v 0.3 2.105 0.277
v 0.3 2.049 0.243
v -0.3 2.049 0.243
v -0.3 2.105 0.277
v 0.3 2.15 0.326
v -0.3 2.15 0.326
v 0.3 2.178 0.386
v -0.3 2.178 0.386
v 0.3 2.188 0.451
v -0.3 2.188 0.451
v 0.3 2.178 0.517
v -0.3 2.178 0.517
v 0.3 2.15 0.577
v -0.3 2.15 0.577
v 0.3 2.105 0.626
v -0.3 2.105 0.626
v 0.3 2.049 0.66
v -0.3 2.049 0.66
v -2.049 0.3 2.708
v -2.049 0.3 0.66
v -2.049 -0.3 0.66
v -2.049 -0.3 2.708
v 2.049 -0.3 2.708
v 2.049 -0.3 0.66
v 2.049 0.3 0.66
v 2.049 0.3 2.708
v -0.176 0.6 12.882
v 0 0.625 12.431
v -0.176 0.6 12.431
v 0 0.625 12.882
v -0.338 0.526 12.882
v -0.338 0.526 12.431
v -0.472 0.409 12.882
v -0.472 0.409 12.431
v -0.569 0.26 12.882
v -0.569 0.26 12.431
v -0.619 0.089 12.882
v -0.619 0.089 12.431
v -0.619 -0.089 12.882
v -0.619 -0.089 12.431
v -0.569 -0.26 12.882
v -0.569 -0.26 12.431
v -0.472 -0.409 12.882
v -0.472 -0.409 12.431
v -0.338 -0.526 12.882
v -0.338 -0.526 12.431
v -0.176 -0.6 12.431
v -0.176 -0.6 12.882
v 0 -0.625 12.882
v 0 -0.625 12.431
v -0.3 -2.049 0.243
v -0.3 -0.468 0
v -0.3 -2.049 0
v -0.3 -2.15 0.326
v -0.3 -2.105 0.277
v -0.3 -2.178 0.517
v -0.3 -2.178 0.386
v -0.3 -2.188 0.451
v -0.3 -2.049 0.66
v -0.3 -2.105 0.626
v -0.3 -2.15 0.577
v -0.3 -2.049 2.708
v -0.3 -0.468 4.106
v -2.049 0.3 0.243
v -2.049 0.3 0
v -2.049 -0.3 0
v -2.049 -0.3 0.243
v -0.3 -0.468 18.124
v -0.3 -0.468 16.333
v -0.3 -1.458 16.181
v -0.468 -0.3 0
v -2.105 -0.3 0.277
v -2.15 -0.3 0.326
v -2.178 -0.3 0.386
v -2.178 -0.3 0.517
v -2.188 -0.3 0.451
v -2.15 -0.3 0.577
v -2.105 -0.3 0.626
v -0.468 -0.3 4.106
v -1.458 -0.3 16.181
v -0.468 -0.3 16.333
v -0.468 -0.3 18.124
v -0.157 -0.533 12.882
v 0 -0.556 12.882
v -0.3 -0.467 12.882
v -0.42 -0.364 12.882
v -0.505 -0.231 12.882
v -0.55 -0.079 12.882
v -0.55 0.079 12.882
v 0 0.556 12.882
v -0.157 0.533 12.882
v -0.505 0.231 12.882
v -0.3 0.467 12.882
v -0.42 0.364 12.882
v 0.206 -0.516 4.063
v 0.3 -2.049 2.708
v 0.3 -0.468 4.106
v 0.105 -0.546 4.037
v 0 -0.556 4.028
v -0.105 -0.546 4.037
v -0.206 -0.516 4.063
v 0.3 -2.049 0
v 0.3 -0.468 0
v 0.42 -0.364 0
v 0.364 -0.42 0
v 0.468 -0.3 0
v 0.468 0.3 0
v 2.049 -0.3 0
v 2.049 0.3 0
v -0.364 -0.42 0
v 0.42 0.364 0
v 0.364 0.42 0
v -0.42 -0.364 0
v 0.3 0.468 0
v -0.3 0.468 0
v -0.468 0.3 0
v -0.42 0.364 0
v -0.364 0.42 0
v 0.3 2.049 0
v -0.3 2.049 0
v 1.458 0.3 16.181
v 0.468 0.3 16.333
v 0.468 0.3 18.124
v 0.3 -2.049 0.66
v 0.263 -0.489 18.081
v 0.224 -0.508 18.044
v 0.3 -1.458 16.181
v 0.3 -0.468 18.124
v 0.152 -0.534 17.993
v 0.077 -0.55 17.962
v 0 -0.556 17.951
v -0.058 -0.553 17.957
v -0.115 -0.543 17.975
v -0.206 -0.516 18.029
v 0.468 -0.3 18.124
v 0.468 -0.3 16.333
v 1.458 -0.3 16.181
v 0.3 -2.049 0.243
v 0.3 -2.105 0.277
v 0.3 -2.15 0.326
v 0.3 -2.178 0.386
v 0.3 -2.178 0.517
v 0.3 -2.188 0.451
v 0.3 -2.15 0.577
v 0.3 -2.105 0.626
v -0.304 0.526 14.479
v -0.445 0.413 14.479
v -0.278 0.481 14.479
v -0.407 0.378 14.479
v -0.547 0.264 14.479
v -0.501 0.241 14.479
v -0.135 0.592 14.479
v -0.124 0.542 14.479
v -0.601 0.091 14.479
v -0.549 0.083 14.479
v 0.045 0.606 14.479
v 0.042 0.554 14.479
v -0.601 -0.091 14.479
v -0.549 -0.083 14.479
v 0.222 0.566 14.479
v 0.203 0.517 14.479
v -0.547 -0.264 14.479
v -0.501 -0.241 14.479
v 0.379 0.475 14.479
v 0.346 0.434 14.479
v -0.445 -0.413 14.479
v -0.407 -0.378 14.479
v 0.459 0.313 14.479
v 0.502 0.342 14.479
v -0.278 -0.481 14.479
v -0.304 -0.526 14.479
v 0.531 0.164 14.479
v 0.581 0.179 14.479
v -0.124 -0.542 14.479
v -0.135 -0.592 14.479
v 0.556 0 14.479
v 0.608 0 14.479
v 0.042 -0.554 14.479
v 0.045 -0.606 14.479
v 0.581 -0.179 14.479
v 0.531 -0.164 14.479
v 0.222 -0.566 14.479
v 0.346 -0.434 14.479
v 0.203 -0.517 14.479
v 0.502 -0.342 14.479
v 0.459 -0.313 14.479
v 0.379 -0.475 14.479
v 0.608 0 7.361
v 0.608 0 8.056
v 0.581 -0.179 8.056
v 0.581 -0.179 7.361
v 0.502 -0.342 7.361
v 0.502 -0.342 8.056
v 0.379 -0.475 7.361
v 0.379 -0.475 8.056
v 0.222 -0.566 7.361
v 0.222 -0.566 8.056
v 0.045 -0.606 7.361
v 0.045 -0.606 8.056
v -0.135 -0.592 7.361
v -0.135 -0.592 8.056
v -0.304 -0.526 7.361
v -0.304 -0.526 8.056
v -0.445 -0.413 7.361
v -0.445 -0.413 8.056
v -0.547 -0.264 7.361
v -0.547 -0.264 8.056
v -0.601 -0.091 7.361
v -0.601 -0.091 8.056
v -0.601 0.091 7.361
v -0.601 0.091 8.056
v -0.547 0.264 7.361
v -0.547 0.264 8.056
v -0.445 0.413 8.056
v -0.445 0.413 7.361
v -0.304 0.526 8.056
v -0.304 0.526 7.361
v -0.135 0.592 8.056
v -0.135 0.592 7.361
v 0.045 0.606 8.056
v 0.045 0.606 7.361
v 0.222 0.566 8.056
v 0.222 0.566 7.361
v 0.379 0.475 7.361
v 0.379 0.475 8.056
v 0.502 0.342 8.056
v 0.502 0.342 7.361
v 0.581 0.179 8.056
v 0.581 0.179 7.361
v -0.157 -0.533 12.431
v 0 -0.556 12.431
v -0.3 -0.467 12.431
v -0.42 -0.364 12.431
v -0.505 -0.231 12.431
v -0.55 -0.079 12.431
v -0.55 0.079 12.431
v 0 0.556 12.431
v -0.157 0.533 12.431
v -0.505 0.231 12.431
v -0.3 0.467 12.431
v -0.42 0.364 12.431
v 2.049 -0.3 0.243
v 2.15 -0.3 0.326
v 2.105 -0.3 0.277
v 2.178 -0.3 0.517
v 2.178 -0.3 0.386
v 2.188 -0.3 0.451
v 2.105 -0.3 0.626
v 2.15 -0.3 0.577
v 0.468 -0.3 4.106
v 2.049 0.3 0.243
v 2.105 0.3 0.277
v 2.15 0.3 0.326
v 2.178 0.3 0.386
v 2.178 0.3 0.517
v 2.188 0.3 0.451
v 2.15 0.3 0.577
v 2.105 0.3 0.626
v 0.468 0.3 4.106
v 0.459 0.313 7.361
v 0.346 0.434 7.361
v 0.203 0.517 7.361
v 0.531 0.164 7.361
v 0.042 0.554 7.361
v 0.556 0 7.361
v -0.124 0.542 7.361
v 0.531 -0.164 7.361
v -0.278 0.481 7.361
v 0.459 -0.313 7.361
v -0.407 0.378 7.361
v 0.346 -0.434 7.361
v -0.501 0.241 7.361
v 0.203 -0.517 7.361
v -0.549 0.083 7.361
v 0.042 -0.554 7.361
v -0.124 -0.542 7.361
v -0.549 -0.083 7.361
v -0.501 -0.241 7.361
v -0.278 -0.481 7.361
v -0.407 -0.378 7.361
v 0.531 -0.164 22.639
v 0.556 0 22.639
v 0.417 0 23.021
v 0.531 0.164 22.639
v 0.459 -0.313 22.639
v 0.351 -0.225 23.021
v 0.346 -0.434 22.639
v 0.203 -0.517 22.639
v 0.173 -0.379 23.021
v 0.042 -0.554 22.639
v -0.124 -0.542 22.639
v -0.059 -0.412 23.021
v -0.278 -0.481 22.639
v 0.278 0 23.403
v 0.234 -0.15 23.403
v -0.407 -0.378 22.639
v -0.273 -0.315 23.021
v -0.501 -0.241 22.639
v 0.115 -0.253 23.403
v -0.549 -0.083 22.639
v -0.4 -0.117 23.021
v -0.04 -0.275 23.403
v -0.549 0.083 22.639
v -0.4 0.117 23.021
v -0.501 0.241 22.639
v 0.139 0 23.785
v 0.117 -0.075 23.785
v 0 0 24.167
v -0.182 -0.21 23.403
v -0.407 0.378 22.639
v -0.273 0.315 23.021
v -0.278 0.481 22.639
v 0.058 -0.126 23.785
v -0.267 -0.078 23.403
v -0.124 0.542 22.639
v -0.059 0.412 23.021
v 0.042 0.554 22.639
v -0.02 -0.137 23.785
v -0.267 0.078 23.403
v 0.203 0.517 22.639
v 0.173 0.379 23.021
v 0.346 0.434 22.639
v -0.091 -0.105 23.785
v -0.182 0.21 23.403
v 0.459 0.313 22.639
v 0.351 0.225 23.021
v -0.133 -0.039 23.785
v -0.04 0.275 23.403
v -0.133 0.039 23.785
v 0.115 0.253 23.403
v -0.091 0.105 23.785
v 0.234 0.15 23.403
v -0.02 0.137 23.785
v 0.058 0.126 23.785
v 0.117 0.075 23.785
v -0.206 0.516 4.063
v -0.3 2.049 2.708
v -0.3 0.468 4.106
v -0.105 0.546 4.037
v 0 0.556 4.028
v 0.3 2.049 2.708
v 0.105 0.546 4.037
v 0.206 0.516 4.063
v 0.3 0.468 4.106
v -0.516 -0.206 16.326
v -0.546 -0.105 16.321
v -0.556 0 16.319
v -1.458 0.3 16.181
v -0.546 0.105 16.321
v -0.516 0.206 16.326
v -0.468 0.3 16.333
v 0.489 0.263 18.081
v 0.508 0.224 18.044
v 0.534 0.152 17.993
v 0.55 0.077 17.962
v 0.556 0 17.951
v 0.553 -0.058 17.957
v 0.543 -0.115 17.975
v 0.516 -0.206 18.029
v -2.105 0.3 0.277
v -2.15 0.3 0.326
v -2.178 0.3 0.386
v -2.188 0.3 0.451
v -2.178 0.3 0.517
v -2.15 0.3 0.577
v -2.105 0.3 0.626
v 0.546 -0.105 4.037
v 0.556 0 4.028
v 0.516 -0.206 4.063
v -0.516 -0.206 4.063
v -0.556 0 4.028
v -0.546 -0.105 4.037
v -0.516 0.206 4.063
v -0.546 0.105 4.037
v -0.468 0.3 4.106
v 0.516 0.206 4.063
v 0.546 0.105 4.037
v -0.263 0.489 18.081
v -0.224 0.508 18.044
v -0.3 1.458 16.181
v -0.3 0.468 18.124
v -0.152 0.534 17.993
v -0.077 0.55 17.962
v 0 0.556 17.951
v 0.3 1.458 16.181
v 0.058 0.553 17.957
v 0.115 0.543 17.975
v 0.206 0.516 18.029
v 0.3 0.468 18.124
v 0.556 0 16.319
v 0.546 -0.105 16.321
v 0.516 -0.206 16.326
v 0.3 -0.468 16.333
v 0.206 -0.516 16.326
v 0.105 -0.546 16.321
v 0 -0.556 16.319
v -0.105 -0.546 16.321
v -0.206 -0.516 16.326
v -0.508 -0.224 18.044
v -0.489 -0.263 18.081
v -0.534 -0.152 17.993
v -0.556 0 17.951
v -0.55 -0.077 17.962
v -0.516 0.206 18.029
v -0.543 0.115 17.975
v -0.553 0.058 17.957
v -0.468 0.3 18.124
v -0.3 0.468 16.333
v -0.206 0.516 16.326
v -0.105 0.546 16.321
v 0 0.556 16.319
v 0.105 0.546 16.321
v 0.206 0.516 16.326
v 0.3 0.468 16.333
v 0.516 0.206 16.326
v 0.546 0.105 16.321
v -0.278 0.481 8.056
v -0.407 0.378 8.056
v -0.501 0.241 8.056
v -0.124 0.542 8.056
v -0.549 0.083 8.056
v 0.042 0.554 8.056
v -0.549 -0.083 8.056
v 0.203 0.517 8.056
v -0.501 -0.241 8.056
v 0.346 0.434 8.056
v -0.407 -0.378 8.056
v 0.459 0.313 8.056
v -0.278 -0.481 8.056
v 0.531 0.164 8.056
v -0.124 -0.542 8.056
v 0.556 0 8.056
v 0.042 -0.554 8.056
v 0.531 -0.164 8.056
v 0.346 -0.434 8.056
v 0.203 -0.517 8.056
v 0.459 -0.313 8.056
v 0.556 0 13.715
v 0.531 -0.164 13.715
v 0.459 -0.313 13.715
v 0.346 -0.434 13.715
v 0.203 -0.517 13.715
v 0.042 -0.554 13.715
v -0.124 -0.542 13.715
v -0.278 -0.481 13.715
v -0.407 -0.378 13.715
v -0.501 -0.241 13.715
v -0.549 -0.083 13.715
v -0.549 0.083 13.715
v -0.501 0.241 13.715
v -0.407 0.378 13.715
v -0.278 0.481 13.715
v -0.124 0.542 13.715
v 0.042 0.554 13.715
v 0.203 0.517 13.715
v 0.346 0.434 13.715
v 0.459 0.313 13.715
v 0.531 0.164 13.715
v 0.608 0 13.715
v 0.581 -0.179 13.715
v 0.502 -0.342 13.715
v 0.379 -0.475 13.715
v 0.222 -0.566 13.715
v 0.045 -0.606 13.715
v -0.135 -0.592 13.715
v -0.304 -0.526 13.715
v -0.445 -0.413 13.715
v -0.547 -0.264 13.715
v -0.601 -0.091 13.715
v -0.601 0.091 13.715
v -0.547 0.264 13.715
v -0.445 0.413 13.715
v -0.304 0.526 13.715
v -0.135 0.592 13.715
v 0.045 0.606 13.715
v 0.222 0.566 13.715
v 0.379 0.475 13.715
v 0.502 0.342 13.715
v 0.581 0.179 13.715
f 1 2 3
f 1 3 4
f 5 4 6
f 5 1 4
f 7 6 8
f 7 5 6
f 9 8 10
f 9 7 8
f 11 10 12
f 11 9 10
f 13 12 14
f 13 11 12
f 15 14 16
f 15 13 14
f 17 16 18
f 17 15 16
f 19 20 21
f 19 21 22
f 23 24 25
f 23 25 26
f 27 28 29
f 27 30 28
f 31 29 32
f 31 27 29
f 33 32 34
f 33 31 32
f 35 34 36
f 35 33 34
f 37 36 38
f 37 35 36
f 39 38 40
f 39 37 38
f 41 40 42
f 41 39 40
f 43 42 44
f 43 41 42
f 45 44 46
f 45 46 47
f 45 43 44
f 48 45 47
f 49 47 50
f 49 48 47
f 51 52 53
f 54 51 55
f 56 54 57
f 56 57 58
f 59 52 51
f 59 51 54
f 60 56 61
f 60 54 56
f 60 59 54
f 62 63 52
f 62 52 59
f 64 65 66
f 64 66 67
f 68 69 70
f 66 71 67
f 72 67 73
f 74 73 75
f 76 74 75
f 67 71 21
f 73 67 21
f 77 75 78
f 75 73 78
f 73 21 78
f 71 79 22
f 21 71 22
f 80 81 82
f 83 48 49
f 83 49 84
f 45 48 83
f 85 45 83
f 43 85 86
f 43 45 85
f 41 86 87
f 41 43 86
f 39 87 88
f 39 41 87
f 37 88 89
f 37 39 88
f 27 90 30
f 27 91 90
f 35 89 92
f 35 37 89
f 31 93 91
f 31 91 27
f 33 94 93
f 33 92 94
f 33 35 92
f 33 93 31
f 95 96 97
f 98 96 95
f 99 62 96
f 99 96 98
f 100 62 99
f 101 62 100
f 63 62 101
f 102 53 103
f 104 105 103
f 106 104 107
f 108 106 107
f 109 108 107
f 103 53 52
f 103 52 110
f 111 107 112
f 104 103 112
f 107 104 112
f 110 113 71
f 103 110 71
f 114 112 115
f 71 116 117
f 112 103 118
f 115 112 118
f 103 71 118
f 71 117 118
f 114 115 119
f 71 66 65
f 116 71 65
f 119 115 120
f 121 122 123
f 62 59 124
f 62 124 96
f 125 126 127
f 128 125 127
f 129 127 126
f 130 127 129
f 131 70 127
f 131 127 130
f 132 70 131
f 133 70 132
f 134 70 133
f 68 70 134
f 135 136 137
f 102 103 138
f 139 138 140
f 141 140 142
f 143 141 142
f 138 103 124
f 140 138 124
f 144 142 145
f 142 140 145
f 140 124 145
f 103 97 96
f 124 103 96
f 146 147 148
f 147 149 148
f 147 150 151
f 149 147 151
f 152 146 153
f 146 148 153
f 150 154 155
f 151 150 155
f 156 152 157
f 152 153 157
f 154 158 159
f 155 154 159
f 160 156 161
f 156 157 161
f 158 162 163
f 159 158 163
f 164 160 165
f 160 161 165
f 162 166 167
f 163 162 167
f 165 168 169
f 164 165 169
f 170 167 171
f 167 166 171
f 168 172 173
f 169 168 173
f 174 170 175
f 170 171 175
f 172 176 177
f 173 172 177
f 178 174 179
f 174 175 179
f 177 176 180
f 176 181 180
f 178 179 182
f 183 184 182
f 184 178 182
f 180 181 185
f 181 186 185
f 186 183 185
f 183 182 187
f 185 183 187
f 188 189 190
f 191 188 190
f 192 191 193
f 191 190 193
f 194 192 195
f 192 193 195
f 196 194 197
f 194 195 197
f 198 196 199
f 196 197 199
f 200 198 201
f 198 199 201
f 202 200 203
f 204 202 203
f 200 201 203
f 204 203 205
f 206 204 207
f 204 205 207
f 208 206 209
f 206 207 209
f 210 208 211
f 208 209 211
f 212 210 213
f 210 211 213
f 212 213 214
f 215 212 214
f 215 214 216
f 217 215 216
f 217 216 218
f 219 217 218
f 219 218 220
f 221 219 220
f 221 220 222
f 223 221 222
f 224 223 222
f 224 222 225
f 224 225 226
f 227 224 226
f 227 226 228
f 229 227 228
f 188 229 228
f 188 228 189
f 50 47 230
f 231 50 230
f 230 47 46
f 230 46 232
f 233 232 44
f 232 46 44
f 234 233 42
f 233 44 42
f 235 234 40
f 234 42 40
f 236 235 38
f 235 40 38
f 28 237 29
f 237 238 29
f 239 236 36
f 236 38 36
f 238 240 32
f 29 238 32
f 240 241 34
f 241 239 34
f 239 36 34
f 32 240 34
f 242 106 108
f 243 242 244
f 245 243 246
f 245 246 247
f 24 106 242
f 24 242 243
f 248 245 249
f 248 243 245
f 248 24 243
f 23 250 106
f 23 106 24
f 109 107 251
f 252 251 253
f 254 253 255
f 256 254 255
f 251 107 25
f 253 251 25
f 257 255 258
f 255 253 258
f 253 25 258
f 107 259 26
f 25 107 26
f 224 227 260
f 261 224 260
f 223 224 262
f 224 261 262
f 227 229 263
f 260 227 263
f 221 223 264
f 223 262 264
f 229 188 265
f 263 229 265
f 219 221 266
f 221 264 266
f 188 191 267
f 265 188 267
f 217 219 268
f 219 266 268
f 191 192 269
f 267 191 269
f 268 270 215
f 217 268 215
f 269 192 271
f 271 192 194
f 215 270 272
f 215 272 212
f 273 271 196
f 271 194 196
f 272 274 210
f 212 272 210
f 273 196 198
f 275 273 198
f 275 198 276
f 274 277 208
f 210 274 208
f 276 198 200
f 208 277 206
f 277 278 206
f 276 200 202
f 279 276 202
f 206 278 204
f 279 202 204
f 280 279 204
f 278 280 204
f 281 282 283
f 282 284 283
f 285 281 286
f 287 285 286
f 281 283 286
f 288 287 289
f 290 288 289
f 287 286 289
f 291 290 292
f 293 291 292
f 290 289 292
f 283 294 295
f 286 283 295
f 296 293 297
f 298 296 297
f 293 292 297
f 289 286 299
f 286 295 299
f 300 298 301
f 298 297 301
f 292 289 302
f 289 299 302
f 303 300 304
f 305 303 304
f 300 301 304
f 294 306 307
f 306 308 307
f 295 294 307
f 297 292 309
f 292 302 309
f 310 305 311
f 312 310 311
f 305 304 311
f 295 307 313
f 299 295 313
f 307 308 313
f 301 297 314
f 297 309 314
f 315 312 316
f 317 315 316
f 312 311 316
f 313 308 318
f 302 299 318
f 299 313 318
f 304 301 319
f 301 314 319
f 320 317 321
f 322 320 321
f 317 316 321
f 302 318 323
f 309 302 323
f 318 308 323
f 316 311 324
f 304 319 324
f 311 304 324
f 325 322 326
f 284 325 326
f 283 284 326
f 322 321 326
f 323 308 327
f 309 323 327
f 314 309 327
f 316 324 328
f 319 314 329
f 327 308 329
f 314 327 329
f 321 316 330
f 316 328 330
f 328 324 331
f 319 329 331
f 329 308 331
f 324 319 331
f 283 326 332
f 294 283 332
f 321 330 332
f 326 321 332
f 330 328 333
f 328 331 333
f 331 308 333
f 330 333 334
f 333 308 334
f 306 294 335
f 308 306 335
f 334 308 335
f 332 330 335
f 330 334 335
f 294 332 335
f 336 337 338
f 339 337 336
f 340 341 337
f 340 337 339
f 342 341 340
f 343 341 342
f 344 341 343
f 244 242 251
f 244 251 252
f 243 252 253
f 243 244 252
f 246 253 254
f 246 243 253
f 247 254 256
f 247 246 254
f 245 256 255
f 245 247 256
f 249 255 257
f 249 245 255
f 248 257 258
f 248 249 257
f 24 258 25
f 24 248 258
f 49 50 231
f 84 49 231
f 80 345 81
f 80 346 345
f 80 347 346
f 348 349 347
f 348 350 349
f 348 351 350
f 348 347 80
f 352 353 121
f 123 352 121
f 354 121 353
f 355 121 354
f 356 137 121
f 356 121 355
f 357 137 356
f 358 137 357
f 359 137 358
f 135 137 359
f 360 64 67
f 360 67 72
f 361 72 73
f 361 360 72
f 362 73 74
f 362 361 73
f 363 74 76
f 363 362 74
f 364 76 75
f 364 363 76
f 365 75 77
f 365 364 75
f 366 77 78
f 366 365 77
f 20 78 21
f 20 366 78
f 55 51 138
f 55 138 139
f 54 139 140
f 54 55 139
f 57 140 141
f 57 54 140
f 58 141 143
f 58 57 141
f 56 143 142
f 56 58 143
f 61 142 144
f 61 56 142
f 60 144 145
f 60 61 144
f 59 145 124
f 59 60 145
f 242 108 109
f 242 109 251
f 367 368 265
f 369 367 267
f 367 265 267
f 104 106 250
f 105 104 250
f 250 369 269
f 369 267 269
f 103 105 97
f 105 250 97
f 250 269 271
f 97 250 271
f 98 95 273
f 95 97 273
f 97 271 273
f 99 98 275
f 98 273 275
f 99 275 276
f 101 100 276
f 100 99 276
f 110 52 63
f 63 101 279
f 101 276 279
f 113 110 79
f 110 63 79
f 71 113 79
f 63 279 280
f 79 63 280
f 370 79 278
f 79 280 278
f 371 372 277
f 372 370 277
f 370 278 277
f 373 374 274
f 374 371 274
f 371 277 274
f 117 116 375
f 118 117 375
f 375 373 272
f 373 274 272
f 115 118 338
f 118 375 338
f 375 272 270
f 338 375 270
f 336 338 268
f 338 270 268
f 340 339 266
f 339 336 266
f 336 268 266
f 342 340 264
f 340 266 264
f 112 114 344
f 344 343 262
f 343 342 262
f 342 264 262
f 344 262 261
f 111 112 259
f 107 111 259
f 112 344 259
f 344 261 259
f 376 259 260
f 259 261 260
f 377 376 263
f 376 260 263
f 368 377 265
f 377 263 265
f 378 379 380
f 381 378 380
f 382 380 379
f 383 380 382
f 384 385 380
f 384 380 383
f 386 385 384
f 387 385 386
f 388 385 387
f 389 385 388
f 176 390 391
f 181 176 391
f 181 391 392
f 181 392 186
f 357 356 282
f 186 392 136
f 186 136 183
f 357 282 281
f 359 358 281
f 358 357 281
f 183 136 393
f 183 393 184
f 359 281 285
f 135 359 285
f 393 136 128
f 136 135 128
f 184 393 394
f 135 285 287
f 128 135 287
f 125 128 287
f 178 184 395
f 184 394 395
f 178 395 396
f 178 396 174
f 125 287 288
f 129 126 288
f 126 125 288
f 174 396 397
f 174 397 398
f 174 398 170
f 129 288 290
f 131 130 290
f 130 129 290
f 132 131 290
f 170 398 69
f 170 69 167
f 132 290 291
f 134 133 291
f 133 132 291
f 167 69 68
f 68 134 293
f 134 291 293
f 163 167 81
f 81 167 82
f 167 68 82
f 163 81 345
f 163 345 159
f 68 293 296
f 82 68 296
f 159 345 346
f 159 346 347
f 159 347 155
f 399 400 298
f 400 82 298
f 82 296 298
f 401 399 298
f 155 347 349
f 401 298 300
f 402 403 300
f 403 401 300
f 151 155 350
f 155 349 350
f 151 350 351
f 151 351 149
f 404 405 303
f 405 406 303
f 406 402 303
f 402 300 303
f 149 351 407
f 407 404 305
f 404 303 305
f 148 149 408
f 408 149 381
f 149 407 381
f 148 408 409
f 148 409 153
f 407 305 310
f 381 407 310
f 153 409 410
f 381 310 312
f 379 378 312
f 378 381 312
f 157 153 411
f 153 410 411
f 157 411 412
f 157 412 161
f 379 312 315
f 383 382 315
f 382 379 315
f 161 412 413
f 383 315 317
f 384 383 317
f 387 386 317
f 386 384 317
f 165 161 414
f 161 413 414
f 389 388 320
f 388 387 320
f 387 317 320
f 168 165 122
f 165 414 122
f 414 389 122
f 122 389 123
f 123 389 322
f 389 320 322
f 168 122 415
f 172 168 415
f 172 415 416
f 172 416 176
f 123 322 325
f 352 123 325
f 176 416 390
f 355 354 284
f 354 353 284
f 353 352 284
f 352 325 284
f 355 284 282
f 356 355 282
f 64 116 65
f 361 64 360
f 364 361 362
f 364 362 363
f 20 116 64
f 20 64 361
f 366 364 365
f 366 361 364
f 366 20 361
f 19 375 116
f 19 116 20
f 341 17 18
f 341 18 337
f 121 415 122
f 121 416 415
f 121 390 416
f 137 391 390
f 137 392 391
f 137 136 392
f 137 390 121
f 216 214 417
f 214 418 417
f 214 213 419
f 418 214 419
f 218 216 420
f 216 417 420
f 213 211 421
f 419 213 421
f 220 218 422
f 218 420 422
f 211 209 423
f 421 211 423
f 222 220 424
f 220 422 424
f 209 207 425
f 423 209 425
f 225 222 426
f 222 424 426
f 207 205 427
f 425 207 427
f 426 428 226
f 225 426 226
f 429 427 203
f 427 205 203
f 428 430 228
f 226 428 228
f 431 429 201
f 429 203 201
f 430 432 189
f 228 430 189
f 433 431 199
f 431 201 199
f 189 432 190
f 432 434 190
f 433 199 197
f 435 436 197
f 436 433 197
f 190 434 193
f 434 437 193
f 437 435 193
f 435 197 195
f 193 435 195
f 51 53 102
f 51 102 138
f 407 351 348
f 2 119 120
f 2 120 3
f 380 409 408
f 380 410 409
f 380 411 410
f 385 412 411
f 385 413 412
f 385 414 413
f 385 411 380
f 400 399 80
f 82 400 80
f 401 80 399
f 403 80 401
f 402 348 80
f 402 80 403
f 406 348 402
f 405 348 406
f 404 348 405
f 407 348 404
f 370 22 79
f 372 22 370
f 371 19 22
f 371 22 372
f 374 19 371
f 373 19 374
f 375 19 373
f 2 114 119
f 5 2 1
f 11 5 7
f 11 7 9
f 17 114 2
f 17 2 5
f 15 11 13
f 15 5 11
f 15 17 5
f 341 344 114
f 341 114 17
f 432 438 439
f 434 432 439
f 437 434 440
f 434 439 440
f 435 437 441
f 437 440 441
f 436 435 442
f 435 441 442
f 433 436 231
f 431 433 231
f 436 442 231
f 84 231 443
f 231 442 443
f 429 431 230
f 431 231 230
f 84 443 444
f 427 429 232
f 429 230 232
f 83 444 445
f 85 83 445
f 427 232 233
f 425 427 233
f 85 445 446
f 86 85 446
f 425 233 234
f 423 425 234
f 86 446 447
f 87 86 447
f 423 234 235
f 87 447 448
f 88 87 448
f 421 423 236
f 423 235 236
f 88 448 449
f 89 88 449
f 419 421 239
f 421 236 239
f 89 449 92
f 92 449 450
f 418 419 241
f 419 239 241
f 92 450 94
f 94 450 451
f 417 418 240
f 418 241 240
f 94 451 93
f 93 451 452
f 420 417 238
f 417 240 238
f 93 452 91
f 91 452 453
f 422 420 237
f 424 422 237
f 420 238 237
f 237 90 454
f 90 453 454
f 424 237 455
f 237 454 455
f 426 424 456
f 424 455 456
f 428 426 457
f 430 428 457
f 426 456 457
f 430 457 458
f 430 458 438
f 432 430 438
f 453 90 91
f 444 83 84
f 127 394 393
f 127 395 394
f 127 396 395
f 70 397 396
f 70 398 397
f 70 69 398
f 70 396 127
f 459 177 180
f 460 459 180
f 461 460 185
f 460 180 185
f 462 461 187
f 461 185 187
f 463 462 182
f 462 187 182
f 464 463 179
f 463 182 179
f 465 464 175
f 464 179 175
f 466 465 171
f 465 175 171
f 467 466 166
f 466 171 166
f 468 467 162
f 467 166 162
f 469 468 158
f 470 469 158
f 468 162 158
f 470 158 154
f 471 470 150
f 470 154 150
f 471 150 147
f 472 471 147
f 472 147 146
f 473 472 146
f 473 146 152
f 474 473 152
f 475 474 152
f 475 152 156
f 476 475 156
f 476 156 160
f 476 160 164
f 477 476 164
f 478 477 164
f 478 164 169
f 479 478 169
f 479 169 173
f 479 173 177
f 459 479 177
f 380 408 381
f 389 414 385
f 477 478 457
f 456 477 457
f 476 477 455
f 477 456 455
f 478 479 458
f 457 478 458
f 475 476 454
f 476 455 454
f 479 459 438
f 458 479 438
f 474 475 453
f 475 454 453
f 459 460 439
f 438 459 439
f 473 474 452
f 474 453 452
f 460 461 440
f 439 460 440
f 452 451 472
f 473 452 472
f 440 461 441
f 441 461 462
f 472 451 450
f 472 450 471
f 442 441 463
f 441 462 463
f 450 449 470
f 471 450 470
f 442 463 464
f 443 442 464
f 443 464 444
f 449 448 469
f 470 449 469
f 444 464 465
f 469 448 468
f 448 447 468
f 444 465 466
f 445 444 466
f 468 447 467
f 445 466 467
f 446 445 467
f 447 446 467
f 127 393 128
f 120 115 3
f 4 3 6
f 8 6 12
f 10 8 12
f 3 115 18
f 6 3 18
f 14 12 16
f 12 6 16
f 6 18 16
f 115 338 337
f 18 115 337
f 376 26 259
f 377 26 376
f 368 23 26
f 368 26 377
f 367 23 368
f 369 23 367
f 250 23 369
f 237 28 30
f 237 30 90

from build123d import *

# Parameters (mm, degrees)
F3_DEPTH      = 0.3
F4_COUNT      = 4
F5_W          = 0.625
F5_H          = 0.4513888889
F6_ANGLE_BACK = 90
F6_ANGLE      = 180


with BuildPart() as f1:
    # F0 (on Front) → F1 (revolve)
    with BuildSketch(Plane.XZ):
        Polygon((0, 24.1666666667), (0, 0), (0.5555555556, 0), (0.5555555556, 7.3611111111), (0.6076388889, 7.3611111111), (0.6076388889, 8.0555555556), (0.5555555556, 8.0555555556), (0.5555555556, 13.7152777778), (0.6076388889, 13.7152777778), (0.6076388889, 14.4791666667), (0.5555555556, 14.4791666667), (0.5555555556, 22.6388888889), align=None)
    revolve(axis=Axis((0, 0, 12.0833333333), (0, 0, -1)))

    # F2 (on Front) → F3 (join, symmetric)
    with BuildSketch(Plane.XZ):
        with BuildLine():
            Line((0, 0), (2.0486111111, 0))
            Line((2.0486111111, 0), (2.0486111111, 0.2430555556))
            ThreePointArc((2.0486111111, 0.2430555556), (2.1875, 0.4513888889), (2.0486111111, 0.6597222222))
            Line((2.0486111111, 0.6597222222), (2.0486111111, 2.7083333333))
            Line((2.0486111111, 2.7083333333), (0.4, 4.165245478))
            Line((0.4, 4.165245478), (0.4, 16.3433760684))
            Line((0.4, 16.3433760684), (1.4583333333, 16.1805555556))
            Line((1.4583333333, 16.1805555556), (0, 19.0411324786))
            Line((0, 19.0411324786), (0, 0))
        make_face()
    extrude(amount=F3_DEPTH, both=True)

    # F4: F1 ×4 about axis
    f4_axis = Axis((0, 0, 8.0555555556), (0, 0, 1))


with BuildPart() as f1_1:
    add(f1.part)
    for i in range(1, F4_COUNT):
        add(f1.part.rotate(f4_axis, i * 360 / F4_COUNT))

    # F5 (on Front) → F6 (revolve)
    with BuildSketch(Plane.XZ, mode=Mode.PRIVATE) as f6_sk:
        with Locations((-0.3125, 12.65625)):
            Rectangle(F5_W, F5_H)
    revolve(f6_sk.sketch.rotate(Axis((0, 0, 8.0555555556), (0, 0, 1)), -F6_ANGLE_BACK), axis=Axis((0, 0, 8.0555555556), (0, 0, 1)), revolution_arc=F6_ANGLE)


solid = f1_1.part
